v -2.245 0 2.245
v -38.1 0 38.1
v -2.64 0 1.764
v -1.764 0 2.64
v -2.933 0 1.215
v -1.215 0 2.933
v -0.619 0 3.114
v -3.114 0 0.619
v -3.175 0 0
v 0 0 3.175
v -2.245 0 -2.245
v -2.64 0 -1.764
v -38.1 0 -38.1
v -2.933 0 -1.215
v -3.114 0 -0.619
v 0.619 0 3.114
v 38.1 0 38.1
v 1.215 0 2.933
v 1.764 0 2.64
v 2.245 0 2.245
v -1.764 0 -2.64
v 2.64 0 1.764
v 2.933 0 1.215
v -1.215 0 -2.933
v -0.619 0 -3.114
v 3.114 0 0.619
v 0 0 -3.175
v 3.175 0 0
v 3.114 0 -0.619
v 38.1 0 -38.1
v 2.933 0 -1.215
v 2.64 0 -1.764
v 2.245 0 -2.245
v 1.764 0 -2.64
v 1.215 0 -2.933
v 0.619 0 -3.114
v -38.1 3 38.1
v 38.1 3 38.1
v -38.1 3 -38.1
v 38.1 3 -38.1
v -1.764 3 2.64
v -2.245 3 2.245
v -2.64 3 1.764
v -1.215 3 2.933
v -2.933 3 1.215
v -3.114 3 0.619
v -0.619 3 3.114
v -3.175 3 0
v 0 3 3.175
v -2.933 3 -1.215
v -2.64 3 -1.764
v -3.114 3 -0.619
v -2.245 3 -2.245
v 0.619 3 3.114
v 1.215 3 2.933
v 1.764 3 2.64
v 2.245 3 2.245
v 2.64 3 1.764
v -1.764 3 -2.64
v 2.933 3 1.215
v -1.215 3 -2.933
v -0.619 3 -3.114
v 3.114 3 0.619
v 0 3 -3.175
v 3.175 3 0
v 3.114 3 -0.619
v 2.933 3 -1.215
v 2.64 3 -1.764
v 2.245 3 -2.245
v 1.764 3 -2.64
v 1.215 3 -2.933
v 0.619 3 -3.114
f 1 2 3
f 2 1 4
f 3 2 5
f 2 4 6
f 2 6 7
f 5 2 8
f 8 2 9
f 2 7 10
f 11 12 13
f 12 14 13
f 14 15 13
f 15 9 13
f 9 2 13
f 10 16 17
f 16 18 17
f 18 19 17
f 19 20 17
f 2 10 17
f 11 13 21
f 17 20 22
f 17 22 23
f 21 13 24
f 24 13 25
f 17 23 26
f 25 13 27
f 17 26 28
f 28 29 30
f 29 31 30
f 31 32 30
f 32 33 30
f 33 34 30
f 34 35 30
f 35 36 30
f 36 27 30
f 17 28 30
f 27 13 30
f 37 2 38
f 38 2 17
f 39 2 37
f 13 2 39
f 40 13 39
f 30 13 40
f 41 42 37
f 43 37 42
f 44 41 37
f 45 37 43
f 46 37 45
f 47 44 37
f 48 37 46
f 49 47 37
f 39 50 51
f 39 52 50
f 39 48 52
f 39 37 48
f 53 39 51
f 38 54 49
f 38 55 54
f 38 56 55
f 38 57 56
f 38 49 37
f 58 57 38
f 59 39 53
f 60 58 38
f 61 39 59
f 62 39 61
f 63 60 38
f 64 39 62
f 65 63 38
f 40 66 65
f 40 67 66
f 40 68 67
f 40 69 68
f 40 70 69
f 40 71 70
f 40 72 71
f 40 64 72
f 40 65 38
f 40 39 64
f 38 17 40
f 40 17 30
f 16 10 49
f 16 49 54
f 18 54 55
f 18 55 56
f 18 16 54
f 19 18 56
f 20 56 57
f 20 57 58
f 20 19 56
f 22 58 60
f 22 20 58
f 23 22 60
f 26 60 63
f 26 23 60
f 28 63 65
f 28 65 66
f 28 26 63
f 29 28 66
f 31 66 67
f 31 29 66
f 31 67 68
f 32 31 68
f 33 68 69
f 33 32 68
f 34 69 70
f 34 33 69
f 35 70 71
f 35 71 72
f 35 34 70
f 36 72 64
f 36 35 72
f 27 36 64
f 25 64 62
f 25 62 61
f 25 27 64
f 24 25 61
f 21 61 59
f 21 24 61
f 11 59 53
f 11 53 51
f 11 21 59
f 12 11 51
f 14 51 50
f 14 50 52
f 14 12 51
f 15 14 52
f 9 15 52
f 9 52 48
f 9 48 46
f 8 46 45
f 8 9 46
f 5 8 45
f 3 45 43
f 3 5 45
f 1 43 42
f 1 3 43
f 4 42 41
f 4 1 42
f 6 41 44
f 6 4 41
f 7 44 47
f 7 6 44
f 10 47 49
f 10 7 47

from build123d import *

# Parameters (mm, degrees)
SKETCH1_W           = 76.2
SKETCH1_H           = 76.2
SKETCH1_R           = 5
SKETCH1_R_2         = 3.175
BOSS_EXTRUDE1_DEPTH = 3


with BuildPart() as part:
    # Sketch1 → Boss-Extrude1 (new body)
    # profile 1 of 5: a face of its own
    with BuildSketch(Plane(origin=(0, 0, 0), x_dir=(1, 0, 0), z_dir=(0, 1, 0))):
        Rectangle(SKETCH1_W, SKETCH1_H)
        with Locations((31.730846191, 31.730846191)):
            Circle(SKETCH1_R, mode=Mode.SUBTRACT)
        with Locations((-31.730846191, 31.730846191)):
            Circle(SKETCH1_R, mode=Mode.SUBTRACT)
        with Locations((-31.730846191, -31.730846191)):
            Circle(SKETCH1_R, mode=Mode.SUBTRACT)
        with Locations((31.730846191, -31.730846191)):
            Circle(SKETCH1_R, mode=Mode.SUBTRACT)
        with Locations(Location((0, 0, 0), (0, 0, 270))):
            Circle(SKETCH1_R_2, mode=Mode.SUBTRACT)
    # profile 2 of 5: a face of its own
    with BuildSketch(Plane(origin=(0, 0, 0), x_dir=(1, 0, 0), z_dir=(0, 1, 0))):
        with Locations((-31.730846191, 31.730846191)):
            Circle(SKETCH1_R)
    # profile 3 of 5: a face of its own
    with BuildSketch(Plane(origin=(0, 0, 0), x_dir=(1, 0, 0), z_dir=(0, 1, 0))):
        with Locations((31.730846191, 31.730846191)):
            Circle(SKETCH1_R)
    # profile 4 of 5: a face of its own
    with BuildSketch(Plane(origin=(0, 0, 0), x_dir=(1, 0, 0), z_dir=(0, 1, 0))):
        with Locations((31.730846191, -31.730846191)):
            Circle(SKETCH1_R)
    # profile 5 of 5: a face of its own
    with BuildSketch(Plane(origin=(0, 0, 0), x_dir=(1, 0, 0), z_dir=(0, 1, 0))):
        with Locations((-31.730846191, -31.730846191)):
            Circle(SKETCH1_R)
    extrude(amount=BOSS_EXTRUDE1_DEPTH)


solid = part.part
